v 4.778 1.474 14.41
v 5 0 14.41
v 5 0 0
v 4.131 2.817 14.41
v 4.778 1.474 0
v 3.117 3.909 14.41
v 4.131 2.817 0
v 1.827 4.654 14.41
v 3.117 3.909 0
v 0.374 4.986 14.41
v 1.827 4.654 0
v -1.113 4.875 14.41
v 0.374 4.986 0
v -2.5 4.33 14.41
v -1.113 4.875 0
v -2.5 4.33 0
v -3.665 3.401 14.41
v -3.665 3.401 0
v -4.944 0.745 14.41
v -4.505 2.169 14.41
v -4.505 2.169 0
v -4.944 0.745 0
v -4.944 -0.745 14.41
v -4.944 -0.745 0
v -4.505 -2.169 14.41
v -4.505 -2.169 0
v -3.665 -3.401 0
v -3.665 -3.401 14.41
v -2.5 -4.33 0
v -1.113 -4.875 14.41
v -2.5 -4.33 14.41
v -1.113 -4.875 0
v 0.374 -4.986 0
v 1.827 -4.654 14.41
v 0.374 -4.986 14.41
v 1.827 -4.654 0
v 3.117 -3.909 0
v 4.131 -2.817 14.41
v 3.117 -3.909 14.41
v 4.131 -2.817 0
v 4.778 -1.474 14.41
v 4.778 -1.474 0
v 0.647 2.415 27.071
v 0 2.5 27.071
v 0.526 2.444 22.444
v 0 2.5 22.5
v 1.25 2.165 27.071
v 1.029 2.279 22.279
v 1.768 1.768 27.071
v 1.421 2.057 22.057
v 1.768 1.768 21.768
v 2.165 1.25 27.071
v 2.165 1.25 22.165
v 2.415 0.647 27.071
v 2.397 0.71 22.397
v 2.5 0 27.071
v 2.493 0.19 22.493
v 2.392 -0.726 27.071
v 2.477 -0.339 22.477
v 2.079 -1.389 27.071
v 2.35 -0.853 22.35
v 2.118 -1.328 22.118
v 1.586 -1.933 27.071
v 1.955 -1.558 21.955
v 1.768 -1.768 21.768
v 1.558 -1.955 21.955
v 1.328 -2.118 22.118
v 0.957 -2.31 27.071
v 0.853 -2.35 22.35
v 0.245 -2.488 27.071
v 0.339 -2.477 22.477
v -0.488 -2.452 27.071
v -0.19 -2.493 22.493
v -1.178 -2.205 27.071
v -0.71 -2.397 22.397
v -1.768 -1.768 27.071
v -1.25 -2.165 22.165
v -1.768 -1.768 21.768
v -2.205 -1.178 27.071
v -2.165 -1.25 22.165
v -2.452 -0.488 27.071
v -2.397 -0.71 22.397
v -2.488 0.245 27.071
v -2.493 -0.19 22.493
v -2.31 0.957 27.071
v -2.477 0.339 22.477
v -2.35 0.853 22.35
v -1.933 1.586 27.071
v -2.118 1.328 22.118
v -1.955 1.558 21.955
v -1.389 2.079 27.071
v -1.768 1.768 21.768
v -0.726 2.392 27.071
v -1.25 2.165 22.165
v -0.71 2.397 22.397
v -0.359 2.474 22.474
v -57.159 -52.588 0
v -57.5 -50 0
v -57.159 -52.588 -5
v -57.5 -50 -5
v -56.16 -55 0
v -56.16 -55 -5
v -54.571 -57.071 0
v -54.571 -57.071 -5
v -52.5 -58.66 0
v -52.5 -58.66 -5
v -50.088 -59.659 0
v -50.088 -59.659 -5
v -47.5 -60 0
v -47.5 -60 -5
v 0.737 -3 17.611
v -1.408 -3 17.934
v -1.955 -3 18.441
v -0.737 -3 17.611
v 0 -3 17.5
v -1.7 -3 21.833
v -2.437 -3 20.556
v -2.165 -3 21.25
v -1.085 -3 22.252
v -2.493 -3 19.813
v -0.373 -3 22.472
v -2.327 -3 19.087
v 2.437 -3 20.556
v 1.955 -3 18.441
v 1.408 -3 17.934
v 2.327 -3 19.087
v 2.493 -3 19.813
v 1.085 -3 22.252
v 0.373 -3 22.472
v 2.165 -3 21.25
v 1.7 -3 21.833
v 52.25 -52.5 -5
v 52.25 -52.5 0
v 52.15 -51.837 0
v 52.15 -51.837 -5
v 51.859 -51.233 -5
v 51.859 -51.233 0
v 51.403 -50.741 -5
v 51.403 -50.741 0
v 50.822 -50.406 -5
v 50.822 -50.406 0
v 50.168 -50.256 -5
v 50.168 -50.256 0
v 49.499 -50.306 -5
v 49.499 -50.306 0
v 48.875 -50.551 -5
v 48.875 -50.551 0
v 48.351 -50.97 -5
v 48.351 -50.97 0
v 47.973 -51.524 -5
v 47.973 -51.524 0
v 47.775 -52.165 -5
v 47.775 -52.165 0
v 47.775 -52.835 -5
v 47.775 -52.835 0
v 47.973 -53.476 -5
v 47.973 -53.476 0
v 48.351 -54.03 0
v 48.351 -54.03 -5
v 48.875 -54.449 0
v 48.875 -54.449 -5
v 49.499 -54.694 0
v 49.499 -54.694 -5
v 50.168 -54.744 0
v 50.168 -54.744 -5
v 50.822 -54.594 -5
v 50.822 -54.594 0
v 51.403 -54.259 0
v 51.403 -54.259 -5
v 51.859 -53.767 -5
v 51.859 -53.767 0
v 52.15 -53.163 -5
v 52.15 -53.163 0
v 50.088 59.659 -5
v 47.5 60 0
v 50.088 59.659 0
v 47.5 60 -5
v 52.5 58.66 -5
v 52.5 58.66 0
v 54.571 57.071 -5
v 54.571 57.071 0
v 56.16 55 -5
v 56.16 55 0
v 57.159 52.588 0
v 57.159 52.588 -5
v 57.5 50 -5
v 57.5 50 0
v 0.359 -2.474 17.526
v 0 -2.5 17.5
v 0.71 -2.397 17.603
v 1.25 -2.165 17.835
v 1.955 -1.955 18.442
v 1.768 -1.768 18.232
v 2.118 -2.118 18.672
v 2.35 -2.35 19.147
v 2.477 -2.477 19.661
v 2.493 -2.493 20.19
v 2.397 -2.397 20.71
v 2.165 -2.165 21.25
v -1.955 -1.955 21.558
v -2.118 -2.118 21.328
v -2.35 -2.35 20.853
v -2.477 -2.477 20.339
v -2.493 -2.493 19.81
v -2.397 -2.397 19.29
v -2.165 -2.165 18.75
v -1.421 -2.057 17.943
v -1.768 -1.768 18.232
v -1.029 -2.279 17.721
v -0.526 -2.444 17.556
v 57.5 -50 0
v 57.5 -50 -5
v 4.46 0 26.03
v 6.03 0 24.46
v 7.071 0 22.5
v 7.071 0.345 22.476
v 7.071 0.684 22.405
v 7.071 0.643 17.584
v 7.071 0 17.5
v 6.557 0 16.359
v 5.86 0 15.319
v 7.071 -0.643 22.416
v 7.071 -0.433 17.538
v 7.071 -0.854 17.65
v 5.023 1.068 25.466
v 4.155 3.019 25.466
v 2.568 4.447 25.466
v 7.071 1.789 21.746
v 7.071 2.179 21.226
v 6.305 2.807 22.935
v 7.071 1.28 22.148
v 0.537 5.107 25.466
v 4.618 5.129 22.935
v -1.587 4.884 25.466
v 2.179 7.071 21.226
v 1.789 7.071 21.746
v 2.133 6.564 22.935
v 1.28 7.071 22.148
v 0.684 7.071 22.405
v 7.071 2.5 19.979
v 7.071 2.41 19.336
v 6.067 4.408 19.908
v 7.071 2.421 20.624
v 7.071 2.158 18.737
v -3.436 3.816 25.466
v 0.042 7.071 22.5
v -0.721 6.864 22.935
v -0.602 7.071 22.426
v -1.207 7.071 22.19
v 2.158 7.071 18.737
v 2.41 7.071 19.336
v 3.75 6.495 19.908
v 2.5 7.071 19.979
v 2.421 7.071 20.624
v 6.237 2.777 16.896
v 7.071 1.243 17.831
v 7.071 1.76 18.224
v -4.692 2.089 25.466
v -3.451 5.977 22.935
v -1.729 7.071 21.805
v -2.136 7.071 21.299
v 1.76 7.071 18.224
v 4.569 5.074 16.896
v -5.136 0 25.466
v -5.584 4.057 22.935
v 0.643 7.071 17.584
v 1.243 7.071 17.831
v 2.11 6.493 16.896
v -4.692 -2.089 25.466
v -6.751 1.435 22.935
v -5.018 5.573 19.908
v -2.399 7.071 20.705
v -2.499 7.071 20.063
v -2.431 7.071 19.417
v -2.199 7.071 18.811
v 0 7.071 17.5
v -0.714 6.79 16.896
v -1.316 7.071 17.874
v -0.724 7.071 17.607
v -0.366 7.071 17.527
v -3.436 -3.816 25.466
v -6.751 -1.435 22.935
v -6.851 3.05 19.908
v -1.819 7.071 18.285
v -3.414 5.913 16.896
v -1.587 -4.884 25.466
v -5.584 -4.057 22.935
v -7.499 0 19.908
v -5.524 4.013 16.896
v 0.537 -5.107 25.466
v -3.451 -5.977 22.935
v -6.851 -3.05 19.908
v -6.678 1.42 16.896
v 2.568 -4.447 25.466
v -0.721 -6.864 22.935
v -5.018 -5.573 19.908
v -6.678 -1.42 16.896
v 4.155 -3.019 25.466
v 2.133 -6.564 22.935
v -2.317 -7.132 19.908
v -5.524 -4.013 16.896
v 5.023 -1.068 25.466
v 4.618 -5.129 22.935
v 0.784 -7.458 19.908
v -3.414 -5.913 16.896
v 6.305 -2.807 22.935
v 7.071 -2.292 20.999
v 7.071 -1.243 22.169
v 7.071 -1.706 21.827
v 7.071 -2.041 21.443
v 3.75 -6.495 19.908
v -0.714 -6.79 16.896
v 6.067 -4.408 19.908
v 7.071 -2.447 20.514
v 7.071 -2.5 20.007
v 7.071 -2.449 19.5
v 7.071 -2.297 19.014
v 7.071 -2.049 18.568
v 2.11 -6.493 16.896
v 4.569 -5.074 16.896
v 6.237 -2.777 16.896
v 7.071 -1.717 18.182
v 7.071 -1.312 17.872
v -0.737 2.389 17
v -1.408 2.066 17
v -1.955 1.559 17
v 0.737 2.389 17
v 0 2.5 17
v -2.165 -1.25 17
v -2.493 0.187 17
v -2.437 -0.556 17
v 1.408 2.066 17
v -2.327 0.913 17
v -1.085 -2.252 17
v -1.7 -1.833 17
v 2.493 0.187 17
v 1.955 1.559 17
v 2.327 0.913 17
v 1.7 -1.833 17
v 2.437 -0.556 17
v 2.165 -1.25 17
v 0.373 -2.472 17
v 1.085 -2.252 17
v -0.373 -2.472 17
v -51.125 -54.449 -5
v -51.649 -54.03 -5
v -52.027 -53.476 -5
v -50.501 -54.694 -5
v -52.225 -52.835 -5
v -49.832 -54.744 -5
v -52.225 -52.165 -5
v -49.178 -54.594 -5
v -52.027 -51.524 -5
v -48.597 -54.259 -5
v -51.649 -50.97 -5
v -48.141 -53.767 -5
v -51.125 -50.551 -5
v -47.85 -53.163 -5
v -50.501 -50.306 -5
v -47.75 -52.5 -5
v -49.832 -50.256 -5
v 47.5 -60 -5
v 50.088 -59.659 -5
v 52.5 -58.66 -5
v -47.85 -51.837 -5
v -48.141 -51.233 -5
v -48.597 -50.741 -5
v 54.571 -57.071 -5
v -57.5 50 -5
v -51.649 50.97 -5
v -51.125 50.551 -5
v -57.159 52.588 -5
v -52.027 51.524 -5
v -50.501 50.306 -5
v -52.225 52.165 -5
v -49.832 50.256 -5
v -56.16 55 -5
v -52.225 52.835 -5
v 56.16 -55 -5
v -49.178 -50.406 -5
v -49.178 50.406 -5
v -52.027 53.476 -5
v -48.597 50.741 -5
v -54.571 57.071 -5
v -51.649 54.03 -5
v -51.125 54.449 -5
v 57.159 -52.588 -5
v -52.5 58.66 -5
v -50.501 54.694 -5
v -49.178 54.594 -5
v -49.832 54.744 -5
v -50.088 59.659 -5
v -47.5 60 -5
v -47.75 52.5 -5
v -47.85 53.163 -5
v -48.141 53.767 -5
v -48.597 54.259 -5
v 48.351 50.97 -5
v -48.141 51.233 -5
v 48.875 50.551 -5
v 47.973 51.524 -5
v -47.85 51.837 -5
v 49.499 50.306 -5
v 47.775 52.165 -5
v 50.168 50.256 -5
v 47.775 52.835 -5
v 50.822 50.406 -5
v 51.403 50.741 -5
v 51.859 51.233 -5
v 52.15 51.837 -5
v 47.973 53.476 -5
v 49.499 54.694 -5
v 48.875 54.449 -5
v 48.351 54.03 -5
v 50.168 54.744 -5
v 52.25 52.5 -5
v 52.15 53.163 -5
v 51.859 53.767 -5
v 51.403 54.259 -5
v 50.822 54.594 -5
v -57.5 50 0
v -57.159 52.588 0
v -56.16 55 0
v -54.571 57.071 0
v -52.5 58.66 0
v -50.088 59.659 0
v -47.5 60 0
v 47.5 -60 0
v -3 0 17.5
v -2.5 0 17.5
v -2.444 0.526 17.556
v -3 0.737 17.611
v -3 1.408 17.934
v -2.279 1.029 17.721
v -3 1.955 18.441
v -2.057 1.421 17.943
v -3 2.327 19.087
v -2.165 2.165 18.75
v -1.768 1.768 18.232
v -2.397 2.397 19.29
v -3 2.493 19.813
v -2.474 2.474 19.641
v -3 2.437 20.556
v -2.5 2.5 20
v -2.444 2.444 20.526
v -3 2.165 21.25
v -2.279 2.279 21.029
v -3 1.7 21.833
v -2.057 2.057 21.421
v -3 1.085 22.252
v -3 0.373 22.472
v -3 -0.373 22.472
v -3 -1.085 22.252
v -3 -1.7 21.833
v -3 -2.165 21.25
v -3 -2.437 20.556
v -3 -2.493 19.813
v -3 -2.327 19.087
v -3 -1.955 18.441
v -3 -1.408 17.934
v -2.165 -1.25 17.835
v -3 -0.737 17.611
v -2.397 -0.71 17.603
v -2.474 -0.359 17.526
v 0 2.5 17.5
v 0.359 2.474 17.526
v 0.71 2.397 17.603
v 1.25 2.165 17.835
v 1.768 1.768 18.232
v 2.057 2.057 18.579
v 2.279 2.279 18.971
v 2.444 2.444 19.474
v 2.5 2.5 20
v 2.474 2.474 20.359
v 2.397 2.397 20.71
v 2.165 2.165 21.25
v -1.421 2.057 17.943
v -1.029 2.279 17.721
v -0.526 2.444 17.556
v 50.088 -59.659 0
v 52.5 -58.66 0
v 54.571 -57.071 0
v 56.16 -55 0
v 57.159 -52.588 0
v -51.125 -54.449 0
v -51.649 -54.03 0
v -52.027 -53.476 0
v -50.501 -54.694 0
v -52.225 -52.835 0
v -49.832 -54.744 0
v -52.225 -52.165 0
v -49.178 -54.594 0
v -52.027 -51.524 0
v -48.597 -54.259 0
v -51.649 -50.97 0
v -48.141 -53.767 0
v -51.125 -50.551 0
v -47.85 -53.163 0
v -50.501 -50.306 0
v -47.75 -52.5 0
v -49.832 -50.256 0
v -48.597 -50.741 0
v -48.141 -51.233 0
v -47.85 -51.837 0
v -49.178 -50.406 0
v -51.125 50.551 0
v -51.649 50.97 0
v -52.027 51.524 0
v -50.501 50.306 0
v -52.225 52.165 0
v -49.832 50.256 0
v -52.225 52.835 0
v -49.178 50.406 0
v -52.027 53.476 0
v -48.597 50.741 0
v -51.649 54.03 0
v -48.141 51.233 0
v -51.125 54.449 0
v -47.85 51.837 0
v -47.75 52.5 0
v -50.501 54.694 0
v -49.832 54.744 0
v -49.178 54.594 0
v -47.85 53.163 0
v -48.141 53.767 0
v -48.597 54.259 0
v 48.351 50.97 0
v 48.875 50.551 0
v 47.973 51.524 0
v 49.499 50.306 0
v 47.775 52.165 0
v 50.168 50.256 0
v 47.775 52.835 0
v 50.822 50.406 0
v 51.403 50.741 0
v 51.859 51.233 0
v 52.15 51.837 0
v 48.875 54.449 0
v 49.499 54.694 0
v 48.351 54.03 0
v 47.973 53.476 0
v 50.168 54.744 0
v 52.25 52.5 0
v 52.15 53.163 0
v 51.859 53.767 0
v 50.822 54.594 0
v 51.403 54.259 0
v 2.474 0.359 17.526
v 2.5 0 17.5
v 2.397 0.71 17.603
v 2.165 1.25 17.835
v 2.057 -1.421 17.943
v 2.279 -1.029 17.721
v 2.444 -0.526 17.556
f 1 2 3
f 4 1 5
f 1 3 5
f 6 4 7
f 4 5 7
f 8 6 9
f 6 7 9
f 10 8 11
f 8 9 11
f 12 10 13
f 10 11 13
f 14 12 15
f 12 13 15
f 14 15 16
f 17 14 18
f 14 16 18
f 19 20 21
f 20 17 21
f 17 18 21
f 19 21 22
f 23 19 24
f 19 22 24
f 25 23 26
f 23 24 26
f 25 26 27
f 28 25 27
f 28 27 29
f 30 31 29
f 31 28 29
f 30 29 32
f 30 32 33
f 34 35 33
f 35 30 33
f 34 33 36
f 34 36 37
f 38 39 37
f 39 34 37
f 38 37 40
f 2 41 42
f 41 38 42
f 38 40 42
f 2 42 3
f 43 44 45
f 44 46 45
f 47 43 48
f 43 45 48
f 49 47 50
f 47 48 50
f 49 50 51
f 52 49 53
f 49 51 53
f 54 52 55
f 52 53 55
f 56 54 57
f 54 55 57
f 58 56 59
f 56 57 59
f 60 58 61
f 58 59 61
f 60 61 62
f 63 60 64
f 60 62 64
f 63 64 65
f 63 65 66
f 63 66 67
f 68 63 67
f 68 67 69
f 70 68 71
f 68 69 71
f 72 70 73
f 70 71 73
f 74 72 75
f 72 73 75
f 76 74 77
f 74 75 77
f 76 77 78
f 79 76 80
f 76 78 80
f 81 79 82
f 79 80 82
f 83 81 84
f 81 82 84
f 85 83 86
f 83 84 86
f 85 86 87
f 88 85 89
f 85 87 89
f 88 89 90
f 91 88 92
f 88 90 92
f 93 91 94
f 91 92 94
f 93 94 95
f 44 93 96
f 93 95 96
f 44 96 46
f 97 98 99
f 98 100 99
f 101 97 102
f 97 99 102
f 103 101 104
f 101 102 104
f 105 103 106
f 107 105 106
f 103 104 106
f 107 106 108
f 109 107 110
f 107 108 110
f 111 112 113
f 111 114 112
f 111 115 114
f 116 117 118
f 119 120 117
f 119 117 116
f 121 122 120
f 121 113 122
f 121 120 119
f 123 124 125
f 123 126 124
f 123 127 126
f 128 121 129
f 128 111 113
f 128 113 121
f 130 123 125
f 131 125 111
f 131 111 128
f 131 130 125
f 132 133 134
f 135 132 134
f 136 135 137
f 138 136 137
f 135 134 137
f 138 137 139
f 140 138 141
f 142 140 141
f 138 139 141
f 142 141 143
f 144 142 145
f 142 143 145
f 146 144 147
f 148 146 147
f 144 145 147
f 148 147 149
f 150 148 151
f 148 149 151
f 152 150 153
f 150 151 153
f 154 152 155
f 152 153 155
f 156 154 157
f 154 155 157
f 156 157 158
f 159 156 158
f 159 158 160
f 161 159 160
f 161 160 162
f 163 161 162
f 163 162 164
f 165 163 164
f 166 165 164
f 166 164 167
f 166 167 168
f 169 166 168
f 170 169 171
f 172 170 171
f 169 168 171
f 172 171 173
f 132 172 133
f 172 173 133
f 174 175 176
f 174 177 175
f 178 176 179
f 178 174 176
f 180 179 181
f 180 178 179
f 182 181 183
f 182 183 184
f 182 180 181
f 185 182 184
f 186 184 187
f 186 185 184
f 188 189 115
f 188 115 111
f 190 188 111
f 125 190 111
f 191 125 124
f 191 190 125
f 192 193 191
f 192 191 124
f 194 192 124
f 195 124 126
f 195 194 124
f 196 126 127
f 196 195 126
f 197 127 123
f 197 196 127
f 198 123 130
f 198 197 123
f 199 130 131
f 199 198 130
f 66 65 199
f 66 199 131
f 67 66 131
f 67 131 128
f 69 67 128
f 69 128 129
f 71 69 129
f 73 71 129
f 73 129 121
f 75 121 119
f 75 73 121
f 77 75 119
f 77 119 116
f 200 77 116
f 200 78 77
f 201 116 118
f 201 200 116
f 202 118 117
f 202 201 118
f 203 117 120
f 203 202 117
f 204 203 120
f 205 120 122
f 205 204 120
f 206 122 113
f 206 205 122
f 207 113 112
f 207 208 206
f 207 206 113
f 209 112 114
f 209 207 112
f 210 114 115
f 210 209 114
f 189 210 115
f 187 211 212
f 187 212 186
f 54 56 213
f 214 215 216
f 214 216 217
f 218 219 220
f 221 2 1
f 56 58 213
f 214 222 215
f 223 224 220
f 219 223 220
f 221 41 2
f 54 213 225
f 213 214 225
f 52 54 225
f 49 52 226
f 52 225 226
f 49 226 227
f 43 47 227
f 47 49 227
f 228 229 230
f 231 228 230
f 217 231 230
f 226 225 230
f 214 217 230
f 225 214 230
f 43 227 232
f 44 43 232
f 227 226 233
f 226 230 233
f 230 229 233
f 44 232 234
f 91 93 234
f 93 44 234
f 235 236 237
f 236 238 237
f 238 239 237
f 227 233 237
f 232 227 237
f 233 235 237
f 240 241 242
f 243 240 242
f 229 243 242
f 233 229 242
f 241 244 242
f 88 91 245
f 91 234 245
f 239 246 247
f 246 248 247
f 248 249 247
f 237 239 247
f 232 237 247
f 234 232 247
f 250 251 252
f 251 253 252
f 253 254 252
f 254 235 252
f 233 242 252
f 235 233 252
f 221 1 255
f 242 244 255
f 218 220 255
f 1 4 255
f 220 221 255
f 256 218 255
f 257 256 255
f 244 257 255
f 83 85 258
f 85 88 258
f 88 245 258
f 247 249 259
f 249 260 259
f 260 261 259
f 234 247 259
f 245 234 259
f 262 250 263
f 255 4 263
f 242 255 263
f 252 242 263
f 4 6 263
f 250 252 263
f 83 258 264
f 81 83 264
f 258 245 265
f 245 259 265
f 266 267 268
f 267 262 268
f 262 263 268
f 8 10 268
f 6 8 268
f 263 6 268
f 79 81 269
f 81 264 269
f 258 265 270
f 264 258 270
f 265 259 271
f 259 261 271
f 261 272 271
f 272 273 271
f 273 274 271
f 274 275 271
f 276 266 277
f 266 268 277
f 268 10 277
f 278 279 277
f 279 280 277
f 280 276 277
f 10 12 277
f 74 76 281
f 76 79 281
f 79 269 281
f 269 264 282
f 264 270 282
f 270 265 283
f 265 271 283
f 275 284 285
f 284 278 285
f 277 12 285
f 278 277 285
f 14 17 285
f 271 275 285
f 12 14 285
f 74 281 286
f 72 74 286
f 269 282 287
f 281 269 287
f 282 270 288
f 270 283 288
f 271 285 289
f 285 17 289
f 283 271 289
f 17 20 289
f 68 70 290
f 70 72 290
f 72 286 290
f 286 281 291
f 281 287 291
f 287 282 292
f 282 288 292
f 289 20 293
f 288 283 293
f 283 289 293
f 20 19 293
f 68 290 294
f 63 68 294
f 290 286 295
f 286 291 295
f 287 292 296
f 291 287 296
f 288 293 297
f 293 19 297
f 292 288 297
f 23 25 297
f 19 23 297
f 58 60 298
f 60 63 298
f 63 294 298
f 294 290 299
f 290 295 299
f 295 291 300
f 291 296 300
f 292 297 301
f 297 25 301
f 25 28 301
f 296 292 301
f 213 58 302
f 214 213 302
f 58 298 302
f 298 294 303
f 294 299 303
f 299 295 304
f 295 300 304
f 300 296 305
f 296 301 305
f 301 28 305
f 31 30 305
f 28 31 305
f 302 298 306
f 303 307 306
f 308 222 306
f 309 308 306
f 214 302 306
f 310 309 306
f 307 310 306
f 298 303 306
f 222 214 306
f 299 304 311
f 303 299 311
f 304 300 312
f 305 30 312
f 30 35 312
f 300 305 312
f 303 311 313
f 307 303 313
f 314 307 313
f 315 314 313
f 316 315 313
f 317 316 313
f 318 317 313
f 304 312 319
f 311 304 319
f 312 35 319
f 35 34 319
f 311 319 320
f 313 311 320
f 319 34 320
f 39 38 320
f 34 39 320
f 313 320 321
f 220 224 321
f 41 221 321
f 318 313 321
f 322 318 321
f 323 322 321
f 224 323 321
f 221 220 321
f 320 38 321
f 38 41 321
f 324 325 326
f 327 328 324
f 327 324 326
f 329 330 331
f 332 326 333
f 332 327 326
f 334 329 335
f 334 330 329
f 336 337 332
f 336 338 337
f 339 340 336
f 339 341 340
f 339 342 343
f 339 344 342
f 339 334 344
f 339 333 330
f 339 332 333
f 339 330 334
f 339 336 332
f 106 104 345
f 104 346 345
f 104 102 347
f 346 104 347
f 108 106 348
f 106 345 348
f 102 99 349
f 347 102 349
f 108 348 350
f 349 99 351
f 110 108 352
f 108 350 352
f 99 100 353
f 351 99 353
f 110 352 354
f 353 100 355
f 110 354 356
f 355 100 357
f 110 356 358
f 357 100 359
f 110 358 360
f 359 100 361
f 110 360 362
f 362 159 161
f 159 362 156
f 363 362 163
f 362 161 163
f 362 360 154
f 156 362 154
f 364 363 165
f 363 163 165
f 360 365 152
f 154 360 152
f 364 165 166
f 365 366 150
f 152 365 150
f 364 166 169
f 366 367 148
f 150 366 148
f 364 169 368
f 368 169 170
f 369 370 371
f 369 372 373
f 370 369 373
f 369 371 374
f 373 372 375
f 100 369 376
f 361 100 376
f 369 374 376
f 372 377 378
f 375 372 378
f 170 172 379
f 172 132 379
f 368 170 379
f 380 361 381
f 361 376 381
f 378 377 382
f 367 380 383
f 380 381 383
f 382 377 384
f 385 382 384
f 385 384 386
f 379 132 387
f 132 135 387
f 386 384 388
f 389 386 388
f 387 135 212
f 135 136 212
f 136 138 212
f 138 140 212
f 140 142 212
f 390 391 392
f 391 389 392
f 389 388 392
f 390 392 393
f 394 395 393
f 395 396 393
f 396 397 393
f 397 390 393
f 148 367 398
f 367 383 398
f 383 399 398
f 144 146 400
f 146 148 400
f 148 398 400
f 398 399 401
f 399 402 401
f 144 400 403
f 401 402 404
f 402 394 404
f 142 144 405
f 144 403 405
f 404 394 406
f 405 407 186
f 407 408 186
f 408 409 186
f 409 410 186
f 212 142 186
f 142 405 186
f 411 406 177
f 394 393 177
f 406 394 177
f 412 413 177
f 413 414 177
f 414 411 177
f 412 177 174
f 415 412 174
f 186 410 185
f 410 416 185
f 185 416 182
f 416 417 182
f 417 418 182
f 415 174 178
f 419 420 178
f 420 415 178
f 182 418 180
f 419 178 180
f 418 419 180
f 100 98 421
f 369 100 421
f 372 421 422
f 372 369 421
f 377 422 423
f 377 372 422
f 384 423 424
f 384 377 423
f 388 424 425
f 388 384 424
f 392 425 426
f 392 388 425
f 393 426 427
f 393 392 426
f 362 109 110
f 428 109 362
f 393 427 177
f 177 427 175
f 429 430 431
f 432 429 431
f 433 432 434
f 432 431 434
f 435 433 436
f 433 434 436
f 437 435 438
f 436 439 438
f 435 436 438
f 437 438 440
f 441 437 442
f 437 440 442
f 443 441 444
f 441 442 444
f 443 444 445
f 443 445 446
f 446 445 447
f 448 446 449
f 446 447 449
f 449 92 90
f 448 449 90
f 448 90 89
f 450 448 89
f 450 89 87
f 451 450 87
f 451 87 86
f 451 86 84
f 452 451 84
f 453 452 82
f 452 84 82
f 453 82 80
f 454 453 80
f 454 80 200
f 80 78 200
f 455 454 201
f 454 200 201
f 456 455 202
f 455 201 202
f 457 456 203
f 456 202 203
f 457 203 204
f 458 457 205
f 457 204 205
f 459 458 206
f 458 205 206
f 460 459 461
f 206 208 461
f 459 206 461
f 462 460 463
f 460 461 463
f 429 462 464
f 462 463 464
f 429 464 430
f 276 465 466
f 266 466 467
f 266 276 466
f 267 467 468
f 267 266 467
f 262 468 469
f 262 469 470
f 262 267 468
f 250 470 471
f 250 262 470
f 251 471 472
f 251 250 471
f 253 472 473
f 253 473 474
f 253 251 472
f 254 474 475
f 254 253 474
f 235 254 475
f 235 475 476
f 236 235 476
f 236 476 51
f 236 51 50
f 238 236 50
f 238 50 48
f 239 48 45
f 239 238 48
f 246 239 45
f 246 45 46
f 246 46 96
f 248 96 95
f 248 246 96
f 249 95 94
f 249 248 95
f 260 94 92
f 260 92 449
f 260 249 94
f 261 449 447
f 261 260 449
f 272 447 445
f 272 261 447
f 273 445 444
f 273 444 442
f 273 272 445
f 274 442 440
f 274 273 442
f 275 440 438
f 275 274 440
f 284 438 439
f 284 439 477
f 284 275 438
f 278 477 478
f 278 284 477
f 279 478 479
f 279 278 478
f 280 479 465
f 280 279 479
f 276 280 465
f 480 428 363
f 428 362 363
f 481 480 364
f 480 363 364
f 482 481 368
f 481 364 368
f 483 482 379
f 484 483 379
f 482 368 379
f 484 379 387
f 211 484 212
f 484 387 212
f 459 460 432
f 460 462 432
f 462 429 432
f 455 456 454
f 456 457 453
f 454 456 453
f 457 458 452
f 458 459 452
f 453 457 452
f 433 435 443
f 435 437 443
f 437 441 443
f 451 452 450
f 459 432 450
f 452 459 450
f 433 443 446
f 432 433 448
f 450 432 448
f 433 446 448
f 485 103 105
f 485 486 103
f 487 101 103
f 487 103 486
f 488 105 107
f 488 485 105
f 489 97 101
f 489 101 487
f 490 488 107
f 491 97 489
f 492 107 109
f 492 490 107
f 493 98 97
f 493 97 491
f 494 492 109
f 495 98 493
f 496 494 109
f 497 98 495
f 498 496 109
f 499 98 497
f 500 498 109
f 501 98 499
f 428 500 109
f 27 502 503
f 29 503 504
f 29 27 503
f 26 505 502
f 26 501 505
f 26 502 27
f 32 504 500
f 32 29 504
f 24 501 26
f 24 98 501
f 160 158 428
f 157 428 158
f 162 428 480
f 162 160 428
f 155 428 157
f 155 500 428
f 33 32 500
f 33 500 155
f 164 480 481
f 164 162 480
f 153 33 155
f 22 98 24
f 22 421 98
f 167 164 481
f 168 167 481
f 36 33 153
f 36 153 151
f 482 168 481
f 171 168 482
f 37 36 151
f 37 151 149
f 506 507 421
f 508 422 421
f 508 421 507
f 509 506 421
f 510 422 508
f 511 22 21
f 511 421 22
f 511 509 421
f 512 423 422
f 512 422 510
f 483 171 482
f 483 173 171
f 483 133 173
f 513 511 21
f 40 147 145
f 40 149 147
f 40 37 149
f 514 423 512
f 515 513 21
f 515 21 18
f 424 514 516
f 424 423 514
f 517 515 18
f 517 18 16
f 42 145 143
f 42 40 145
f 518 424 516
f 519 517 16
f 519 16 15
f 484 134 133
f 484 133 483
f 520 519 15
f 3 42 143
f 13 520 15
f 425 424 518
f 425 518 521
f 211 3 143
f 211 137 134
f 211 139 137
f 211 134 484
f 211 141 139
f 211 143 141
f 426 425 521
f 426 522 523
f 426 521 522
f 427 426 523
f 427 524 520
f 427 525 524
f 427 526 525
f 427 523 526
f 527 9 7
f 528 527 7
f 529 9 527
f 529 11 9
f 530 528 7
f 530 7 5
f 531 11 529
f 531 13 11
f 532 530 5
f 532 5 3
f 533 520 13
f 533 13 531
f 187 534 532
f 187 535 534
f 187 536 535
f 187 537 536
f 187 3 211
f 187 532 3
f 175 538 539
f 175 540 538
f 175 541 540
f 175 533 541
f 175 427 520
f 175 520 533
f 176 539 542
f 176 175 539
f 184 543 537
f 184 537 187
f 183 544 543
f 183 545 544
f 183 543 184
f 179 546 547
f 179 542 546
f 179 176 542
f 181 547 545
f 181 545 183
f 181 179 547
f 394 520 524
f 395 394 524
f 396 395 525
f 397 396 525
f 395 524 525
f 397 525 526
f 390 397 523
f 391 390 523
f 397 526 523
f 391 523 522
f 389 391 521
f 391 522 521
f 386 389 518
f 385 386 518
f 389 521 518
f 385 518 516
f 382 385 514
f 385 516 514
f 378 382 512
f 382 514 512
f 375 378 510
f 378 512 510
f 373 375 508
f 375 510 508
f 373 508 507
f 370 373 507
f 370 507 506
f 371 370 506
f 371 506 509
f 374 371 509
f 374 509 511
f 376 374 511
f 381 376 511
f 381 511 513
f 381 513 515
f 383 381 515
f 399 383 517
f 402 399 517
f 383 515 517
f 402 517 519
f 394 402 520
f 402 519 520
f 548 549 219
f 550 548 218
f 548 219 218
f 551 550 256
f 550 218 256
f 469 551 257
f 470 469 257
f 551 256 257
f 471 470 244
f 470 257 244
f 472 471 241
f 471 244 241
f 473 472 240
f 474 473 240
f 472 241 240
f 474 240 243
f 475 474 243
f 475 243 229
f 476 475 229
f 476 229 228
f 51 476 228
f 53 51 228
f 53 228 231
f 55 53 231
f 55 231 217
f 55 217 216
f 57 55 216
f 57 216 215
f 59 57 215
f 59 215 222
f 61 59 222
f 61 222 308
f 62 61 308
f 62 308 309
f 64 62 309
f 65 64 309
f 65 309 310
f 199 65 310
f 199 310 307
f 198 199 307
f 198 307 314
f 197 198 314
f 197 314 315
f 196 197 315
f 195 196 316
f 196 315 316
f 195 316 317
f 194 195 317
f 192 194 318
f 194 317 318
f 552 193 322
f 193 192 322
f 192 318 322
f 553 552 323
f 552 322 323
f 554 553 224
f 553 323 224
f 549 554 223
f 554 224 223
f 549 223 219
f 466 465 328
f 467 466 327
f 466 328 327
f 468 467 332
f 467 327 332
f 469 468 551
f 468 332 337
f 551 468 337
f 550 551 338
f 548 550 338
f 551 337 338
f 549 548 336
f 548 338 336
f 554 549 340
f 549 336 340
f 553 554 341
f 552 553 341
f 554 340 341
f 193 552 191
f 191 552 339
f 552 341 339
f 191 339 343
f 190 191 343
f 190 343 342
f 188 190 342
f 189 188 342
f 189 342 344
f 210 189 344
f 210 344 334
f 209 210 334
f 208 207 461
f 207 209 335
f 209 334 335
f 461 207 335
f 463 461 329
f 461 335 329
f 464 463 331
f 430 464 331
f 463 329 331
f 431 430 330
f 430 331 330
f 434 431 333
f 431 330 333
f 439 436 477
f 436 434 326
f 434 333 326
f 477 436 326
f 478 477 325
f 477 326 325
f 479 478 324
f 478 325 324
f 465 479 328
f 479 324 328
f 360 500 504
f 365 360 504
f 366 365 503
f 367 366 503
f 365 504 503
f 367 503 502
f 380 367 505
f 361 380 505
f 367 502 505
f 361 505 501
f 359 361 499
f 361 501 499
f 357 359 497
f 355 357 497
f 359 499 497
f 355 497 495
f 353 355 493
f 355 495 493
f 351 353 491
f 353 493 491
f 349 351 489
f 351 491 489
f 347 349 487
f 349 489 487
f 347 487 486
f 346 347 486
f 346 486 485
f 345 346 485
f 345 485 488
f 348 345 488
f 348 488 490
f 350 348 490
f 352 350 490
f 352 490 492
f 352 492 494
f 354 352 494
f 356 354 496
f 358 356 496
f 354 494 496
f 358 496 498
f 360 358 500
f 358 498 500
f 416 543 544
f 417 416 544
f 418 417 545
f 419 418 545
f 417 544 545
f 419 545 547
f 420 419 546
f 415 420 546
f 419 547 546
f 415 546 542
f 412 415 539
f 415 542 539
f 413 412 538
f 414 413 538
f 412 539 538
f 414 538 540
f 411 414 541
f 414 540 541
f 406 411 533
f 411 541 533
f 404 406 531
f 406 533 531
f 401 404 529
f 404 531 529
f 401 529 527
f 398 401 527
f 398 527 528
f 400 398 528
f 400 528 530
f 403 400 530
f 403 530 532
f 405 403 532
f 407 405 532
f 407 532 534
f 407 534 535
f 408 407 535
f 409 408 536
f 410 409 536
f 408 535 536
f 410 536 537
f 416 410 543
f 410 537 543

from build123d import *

# Parameters (mm, degrees)
SKETCH2_W           = 115
SKETCH2_H           = 120
SKETCH2_R           = 2.25
BOSS_EXTRUDE1_DEPTH = 5
SKETCH3_R           = 5
BOSS_EXTRUDE2_DEPTH = 20
SKETCH6_W           = 2.5
SKETCH6_H           = 18
SKETCH8_W           = 18
SKETCH8_H           = 2.5
SKETCH9_W           = 18
SKETCH9_H           = 2.5
FILLET1_R           = 10


with BuildPart() as part:
    # Sketch2 → Boss-Extrude1 (new body)
    with BuildSketch(Plane.XY):
        Rectangle(SKETCH2_W, SKETCH2_H)
        with Locations((50, 52.5)):
            Circle(SKETCH2_R, mode=Mode.SUBTRACT)
        with Locations((50, -52.5)):
            Circle(SKETCH2_R, mode=Mode.SUBTRACT)
        with Locations((-50, -52.5)):
            Circle(SKETCH2_R, mode=Mode.SUBTRACT)
        with Locations((-50, 52.5)):
            Circle(SKETCH2_R, mode=Mode.SUBTRACT)
    extrude(amount=-BOSS_EXTRUDE1_DEPTH)

    # Sketch3 → Boss-Extrude2 (add)
    with BuildSketch(Plane.XY):
        Circle(SKETCH3_R)
    extrude(amount=BOSS_EXTRUDE2_DEPTH)

    # Sketch4 → Revolve3 (revolve)
    with BuildSketch(Plane(origin=(0, 0, 0), x_dir=(1, 0, 0), z_dir=(0, 1, 0))):
        with BuildLine():
            Line((0, -12.5), (0, -27.5))
            ThreePointArc((0, -27.5), (7.5, -20), (0, -12.5))
        make_face()
    revolve(axis=Axis((0, 0, -22.886774461), (0, 0, 1)))

    # Sketch6 → Cut-Revolve1 (revolve, cut)
    with BuildSketch(Plane(origin=(0, 0, 0), x_dir=(0, 0, -1), z_dir=(1, 0, 0))):
        with Locations((-18.75, 6)):
            Rectangle(SKETCH6_W, SKETCH6_H)
    revolve(axis=Axis((0, 42.177542576, 20), (0, -1, 0)), mode=Mode.SUBTRACT)

    # Sketch8 → Cut-Revolve2 (revolve, cut)
    with BuildSketch(Plane(origin=(0, 0, 0), x_dir=(0, 0, -1), z_dir=(1, 0, 0))):
        with Locations((-26, 1.25)):
            Rectangle(SKETCH8_W, SKETCH8_H)
    revolve(axis=Axis((0, 0, 46.4260406), (0, 0, -1)), mode=Mode.SUBTRACT)

    # Sketch9 → Cut-Revolve3 (revolve, cut)
    with BuildSketch(Plane(origin=(0, 0, 0), x_dir=(1, 0, 0), z_dir=(0, 1, 0))):
        with Locations((6, -18.75)):
            Rectangle(SKETCH9_W, SKETCH9_H)
    revolve(axis=Axis((-16.030191757, 0, 20), (1, 0, 0)), mode=Mode.SUBTRACT)

    # Fillet1
    fillet1_edges = [part.edges().sort_by_distance(p)[0] for p in [
        (-57.5, 60, -2.5),
        (57.5, 60, -2.5),
        (57.5, -60, -2.5),
        (-57.5, -60, -2.5),
    ]]
    fillet(fillet1_edges, radius=FILLET1_R)


solid = part.part
